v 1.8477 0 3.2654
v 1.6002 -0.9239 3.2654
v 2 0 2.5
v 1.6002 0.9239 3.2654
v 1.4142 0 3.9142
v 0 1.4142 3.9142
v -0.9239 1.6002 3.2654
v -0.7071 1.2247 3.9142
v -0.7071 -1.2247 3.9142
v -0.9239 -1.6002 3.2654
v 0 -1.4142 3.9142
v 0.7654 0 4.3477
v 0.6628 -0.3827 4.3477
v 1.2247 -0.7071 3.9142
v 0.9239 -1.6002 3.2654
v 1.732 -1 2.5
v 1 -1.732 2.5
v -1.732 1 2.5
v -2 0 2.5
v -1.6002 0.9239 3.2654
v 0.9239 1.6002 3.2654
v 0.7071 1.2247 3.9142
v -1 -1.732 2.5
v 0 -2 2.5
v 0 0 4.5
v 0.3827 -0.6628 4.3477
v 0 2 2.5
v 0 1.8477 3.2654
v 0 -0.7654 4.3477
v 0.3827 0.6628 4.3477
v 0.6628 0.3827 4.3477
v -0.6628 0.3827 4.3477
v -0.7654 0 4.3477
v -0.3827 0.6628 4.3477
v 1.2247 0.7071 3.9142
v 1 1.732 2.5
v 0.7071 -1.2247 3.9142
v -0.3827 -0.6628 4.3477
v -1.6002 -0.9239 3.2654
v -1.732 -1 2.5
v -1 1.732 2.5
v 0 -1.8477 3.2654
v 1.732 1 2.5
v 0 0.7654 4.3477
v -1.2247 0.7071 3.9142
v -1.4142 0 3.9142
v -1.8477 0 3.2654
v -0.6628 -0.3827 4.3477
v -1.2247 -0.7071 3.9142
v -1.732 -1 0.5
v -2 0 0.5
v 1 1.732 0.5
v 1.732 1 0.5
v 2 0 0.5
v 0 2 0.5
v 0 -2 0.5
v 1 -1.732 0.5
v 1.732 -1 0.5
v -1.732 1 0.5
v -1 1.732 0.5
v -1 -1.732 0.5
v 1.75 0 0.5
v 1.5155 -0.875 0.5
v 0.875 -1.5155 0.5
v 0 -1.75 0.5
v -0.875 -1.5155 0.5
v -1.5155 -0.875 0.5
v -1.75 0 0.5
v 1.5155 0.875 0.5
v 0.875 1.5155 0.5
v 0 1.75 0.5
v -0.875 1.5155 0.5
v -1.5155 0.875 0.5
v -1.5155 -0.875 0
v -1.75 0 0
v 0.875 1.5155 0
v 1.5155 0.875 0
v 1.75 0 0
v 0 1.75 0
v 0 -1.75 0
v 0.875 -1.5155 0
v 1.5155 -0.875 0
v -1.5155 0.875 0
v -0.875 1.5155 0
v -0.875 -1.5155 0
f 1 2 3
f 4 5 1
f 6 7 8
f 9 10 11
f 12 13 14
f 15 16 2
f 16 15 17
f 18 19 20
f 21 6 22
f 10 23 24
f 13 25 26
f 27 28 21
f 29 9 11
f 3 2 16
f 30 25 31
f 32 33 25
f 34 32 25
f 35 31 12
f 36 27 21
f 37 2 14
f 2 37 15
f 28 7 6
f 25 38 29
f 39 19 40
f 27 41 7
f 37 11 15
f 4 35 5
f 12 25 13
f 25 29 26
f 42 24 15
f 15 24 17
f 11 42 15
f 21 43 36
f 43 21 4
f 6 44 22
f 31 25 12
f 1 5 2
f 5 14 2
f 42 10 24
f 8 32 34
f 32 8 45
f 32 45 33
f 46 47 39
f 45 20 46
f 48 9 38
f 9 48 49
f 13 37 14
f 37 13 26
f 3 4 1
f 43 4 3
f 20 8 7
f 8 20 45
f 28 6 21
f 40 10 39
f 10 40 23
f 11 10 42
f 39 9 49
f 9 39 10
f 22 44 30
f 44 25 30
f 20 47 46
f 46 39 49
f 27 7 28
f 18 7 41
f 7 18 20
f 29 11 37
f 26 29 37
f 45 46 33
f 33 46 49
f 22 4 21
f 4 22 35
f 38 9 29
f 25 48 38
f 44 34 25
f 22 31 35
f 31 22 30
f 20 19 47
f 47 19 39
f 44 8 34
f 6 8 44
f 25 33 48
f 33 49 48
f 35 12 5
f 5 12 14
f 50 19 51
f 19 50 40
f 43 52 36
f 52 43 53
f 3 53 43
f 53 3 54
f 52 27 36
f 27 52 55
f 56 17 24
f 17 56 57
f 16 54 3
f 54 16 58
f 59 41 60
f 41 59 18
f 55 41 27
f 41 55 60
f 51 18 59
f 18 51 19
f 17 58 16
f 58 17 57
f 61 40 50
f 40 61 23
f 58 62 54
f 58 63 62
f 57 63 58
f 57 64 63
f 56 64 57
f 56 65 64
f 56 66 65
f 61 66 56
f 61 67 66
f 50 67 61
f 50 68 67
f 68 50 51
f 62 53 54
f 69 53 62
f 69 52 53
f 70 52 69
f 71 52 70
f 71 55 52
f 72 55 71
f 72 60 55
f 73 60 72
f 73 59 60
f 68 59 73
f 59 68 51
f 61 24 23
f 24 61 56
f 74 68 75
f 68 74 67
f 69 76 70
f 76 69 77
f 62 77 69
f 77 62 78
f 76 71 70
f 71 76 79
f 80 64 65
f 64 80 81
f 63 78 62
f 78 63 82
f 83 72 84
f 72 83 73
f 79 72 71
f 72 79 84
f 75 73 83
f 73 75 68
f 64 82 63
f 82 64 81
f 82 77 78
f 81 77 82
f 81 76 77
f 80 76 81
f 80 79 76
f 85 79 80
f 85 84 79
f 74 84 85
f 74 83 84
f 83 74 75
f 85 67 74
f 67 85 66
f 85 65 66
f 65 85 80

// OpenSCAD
// globe 1x1

// external vars #########################

// part ##################################

module globe_1x1() {
  $fn = 12;
  union() {
    pts_base = [[2,0],[0,-1],[0,2]];
    div = $fn/3;
    pts_arc = [for (i=[1:div-1]) let (ang = 90-(90/div)*i) [cos(ang)*2,sin(ang)*2]];
    pts = concat(pts_base,pts_arc);
    translate([0,0,2.5]) rotate([0,0,180])
    rotate_extrude(angle=360) polygon(pts);
    translate([0,0,0.5]) cylinder(h=2,d=4);
    cylinder(h=1,d=3.5);
  }
}

globe_1x1();
